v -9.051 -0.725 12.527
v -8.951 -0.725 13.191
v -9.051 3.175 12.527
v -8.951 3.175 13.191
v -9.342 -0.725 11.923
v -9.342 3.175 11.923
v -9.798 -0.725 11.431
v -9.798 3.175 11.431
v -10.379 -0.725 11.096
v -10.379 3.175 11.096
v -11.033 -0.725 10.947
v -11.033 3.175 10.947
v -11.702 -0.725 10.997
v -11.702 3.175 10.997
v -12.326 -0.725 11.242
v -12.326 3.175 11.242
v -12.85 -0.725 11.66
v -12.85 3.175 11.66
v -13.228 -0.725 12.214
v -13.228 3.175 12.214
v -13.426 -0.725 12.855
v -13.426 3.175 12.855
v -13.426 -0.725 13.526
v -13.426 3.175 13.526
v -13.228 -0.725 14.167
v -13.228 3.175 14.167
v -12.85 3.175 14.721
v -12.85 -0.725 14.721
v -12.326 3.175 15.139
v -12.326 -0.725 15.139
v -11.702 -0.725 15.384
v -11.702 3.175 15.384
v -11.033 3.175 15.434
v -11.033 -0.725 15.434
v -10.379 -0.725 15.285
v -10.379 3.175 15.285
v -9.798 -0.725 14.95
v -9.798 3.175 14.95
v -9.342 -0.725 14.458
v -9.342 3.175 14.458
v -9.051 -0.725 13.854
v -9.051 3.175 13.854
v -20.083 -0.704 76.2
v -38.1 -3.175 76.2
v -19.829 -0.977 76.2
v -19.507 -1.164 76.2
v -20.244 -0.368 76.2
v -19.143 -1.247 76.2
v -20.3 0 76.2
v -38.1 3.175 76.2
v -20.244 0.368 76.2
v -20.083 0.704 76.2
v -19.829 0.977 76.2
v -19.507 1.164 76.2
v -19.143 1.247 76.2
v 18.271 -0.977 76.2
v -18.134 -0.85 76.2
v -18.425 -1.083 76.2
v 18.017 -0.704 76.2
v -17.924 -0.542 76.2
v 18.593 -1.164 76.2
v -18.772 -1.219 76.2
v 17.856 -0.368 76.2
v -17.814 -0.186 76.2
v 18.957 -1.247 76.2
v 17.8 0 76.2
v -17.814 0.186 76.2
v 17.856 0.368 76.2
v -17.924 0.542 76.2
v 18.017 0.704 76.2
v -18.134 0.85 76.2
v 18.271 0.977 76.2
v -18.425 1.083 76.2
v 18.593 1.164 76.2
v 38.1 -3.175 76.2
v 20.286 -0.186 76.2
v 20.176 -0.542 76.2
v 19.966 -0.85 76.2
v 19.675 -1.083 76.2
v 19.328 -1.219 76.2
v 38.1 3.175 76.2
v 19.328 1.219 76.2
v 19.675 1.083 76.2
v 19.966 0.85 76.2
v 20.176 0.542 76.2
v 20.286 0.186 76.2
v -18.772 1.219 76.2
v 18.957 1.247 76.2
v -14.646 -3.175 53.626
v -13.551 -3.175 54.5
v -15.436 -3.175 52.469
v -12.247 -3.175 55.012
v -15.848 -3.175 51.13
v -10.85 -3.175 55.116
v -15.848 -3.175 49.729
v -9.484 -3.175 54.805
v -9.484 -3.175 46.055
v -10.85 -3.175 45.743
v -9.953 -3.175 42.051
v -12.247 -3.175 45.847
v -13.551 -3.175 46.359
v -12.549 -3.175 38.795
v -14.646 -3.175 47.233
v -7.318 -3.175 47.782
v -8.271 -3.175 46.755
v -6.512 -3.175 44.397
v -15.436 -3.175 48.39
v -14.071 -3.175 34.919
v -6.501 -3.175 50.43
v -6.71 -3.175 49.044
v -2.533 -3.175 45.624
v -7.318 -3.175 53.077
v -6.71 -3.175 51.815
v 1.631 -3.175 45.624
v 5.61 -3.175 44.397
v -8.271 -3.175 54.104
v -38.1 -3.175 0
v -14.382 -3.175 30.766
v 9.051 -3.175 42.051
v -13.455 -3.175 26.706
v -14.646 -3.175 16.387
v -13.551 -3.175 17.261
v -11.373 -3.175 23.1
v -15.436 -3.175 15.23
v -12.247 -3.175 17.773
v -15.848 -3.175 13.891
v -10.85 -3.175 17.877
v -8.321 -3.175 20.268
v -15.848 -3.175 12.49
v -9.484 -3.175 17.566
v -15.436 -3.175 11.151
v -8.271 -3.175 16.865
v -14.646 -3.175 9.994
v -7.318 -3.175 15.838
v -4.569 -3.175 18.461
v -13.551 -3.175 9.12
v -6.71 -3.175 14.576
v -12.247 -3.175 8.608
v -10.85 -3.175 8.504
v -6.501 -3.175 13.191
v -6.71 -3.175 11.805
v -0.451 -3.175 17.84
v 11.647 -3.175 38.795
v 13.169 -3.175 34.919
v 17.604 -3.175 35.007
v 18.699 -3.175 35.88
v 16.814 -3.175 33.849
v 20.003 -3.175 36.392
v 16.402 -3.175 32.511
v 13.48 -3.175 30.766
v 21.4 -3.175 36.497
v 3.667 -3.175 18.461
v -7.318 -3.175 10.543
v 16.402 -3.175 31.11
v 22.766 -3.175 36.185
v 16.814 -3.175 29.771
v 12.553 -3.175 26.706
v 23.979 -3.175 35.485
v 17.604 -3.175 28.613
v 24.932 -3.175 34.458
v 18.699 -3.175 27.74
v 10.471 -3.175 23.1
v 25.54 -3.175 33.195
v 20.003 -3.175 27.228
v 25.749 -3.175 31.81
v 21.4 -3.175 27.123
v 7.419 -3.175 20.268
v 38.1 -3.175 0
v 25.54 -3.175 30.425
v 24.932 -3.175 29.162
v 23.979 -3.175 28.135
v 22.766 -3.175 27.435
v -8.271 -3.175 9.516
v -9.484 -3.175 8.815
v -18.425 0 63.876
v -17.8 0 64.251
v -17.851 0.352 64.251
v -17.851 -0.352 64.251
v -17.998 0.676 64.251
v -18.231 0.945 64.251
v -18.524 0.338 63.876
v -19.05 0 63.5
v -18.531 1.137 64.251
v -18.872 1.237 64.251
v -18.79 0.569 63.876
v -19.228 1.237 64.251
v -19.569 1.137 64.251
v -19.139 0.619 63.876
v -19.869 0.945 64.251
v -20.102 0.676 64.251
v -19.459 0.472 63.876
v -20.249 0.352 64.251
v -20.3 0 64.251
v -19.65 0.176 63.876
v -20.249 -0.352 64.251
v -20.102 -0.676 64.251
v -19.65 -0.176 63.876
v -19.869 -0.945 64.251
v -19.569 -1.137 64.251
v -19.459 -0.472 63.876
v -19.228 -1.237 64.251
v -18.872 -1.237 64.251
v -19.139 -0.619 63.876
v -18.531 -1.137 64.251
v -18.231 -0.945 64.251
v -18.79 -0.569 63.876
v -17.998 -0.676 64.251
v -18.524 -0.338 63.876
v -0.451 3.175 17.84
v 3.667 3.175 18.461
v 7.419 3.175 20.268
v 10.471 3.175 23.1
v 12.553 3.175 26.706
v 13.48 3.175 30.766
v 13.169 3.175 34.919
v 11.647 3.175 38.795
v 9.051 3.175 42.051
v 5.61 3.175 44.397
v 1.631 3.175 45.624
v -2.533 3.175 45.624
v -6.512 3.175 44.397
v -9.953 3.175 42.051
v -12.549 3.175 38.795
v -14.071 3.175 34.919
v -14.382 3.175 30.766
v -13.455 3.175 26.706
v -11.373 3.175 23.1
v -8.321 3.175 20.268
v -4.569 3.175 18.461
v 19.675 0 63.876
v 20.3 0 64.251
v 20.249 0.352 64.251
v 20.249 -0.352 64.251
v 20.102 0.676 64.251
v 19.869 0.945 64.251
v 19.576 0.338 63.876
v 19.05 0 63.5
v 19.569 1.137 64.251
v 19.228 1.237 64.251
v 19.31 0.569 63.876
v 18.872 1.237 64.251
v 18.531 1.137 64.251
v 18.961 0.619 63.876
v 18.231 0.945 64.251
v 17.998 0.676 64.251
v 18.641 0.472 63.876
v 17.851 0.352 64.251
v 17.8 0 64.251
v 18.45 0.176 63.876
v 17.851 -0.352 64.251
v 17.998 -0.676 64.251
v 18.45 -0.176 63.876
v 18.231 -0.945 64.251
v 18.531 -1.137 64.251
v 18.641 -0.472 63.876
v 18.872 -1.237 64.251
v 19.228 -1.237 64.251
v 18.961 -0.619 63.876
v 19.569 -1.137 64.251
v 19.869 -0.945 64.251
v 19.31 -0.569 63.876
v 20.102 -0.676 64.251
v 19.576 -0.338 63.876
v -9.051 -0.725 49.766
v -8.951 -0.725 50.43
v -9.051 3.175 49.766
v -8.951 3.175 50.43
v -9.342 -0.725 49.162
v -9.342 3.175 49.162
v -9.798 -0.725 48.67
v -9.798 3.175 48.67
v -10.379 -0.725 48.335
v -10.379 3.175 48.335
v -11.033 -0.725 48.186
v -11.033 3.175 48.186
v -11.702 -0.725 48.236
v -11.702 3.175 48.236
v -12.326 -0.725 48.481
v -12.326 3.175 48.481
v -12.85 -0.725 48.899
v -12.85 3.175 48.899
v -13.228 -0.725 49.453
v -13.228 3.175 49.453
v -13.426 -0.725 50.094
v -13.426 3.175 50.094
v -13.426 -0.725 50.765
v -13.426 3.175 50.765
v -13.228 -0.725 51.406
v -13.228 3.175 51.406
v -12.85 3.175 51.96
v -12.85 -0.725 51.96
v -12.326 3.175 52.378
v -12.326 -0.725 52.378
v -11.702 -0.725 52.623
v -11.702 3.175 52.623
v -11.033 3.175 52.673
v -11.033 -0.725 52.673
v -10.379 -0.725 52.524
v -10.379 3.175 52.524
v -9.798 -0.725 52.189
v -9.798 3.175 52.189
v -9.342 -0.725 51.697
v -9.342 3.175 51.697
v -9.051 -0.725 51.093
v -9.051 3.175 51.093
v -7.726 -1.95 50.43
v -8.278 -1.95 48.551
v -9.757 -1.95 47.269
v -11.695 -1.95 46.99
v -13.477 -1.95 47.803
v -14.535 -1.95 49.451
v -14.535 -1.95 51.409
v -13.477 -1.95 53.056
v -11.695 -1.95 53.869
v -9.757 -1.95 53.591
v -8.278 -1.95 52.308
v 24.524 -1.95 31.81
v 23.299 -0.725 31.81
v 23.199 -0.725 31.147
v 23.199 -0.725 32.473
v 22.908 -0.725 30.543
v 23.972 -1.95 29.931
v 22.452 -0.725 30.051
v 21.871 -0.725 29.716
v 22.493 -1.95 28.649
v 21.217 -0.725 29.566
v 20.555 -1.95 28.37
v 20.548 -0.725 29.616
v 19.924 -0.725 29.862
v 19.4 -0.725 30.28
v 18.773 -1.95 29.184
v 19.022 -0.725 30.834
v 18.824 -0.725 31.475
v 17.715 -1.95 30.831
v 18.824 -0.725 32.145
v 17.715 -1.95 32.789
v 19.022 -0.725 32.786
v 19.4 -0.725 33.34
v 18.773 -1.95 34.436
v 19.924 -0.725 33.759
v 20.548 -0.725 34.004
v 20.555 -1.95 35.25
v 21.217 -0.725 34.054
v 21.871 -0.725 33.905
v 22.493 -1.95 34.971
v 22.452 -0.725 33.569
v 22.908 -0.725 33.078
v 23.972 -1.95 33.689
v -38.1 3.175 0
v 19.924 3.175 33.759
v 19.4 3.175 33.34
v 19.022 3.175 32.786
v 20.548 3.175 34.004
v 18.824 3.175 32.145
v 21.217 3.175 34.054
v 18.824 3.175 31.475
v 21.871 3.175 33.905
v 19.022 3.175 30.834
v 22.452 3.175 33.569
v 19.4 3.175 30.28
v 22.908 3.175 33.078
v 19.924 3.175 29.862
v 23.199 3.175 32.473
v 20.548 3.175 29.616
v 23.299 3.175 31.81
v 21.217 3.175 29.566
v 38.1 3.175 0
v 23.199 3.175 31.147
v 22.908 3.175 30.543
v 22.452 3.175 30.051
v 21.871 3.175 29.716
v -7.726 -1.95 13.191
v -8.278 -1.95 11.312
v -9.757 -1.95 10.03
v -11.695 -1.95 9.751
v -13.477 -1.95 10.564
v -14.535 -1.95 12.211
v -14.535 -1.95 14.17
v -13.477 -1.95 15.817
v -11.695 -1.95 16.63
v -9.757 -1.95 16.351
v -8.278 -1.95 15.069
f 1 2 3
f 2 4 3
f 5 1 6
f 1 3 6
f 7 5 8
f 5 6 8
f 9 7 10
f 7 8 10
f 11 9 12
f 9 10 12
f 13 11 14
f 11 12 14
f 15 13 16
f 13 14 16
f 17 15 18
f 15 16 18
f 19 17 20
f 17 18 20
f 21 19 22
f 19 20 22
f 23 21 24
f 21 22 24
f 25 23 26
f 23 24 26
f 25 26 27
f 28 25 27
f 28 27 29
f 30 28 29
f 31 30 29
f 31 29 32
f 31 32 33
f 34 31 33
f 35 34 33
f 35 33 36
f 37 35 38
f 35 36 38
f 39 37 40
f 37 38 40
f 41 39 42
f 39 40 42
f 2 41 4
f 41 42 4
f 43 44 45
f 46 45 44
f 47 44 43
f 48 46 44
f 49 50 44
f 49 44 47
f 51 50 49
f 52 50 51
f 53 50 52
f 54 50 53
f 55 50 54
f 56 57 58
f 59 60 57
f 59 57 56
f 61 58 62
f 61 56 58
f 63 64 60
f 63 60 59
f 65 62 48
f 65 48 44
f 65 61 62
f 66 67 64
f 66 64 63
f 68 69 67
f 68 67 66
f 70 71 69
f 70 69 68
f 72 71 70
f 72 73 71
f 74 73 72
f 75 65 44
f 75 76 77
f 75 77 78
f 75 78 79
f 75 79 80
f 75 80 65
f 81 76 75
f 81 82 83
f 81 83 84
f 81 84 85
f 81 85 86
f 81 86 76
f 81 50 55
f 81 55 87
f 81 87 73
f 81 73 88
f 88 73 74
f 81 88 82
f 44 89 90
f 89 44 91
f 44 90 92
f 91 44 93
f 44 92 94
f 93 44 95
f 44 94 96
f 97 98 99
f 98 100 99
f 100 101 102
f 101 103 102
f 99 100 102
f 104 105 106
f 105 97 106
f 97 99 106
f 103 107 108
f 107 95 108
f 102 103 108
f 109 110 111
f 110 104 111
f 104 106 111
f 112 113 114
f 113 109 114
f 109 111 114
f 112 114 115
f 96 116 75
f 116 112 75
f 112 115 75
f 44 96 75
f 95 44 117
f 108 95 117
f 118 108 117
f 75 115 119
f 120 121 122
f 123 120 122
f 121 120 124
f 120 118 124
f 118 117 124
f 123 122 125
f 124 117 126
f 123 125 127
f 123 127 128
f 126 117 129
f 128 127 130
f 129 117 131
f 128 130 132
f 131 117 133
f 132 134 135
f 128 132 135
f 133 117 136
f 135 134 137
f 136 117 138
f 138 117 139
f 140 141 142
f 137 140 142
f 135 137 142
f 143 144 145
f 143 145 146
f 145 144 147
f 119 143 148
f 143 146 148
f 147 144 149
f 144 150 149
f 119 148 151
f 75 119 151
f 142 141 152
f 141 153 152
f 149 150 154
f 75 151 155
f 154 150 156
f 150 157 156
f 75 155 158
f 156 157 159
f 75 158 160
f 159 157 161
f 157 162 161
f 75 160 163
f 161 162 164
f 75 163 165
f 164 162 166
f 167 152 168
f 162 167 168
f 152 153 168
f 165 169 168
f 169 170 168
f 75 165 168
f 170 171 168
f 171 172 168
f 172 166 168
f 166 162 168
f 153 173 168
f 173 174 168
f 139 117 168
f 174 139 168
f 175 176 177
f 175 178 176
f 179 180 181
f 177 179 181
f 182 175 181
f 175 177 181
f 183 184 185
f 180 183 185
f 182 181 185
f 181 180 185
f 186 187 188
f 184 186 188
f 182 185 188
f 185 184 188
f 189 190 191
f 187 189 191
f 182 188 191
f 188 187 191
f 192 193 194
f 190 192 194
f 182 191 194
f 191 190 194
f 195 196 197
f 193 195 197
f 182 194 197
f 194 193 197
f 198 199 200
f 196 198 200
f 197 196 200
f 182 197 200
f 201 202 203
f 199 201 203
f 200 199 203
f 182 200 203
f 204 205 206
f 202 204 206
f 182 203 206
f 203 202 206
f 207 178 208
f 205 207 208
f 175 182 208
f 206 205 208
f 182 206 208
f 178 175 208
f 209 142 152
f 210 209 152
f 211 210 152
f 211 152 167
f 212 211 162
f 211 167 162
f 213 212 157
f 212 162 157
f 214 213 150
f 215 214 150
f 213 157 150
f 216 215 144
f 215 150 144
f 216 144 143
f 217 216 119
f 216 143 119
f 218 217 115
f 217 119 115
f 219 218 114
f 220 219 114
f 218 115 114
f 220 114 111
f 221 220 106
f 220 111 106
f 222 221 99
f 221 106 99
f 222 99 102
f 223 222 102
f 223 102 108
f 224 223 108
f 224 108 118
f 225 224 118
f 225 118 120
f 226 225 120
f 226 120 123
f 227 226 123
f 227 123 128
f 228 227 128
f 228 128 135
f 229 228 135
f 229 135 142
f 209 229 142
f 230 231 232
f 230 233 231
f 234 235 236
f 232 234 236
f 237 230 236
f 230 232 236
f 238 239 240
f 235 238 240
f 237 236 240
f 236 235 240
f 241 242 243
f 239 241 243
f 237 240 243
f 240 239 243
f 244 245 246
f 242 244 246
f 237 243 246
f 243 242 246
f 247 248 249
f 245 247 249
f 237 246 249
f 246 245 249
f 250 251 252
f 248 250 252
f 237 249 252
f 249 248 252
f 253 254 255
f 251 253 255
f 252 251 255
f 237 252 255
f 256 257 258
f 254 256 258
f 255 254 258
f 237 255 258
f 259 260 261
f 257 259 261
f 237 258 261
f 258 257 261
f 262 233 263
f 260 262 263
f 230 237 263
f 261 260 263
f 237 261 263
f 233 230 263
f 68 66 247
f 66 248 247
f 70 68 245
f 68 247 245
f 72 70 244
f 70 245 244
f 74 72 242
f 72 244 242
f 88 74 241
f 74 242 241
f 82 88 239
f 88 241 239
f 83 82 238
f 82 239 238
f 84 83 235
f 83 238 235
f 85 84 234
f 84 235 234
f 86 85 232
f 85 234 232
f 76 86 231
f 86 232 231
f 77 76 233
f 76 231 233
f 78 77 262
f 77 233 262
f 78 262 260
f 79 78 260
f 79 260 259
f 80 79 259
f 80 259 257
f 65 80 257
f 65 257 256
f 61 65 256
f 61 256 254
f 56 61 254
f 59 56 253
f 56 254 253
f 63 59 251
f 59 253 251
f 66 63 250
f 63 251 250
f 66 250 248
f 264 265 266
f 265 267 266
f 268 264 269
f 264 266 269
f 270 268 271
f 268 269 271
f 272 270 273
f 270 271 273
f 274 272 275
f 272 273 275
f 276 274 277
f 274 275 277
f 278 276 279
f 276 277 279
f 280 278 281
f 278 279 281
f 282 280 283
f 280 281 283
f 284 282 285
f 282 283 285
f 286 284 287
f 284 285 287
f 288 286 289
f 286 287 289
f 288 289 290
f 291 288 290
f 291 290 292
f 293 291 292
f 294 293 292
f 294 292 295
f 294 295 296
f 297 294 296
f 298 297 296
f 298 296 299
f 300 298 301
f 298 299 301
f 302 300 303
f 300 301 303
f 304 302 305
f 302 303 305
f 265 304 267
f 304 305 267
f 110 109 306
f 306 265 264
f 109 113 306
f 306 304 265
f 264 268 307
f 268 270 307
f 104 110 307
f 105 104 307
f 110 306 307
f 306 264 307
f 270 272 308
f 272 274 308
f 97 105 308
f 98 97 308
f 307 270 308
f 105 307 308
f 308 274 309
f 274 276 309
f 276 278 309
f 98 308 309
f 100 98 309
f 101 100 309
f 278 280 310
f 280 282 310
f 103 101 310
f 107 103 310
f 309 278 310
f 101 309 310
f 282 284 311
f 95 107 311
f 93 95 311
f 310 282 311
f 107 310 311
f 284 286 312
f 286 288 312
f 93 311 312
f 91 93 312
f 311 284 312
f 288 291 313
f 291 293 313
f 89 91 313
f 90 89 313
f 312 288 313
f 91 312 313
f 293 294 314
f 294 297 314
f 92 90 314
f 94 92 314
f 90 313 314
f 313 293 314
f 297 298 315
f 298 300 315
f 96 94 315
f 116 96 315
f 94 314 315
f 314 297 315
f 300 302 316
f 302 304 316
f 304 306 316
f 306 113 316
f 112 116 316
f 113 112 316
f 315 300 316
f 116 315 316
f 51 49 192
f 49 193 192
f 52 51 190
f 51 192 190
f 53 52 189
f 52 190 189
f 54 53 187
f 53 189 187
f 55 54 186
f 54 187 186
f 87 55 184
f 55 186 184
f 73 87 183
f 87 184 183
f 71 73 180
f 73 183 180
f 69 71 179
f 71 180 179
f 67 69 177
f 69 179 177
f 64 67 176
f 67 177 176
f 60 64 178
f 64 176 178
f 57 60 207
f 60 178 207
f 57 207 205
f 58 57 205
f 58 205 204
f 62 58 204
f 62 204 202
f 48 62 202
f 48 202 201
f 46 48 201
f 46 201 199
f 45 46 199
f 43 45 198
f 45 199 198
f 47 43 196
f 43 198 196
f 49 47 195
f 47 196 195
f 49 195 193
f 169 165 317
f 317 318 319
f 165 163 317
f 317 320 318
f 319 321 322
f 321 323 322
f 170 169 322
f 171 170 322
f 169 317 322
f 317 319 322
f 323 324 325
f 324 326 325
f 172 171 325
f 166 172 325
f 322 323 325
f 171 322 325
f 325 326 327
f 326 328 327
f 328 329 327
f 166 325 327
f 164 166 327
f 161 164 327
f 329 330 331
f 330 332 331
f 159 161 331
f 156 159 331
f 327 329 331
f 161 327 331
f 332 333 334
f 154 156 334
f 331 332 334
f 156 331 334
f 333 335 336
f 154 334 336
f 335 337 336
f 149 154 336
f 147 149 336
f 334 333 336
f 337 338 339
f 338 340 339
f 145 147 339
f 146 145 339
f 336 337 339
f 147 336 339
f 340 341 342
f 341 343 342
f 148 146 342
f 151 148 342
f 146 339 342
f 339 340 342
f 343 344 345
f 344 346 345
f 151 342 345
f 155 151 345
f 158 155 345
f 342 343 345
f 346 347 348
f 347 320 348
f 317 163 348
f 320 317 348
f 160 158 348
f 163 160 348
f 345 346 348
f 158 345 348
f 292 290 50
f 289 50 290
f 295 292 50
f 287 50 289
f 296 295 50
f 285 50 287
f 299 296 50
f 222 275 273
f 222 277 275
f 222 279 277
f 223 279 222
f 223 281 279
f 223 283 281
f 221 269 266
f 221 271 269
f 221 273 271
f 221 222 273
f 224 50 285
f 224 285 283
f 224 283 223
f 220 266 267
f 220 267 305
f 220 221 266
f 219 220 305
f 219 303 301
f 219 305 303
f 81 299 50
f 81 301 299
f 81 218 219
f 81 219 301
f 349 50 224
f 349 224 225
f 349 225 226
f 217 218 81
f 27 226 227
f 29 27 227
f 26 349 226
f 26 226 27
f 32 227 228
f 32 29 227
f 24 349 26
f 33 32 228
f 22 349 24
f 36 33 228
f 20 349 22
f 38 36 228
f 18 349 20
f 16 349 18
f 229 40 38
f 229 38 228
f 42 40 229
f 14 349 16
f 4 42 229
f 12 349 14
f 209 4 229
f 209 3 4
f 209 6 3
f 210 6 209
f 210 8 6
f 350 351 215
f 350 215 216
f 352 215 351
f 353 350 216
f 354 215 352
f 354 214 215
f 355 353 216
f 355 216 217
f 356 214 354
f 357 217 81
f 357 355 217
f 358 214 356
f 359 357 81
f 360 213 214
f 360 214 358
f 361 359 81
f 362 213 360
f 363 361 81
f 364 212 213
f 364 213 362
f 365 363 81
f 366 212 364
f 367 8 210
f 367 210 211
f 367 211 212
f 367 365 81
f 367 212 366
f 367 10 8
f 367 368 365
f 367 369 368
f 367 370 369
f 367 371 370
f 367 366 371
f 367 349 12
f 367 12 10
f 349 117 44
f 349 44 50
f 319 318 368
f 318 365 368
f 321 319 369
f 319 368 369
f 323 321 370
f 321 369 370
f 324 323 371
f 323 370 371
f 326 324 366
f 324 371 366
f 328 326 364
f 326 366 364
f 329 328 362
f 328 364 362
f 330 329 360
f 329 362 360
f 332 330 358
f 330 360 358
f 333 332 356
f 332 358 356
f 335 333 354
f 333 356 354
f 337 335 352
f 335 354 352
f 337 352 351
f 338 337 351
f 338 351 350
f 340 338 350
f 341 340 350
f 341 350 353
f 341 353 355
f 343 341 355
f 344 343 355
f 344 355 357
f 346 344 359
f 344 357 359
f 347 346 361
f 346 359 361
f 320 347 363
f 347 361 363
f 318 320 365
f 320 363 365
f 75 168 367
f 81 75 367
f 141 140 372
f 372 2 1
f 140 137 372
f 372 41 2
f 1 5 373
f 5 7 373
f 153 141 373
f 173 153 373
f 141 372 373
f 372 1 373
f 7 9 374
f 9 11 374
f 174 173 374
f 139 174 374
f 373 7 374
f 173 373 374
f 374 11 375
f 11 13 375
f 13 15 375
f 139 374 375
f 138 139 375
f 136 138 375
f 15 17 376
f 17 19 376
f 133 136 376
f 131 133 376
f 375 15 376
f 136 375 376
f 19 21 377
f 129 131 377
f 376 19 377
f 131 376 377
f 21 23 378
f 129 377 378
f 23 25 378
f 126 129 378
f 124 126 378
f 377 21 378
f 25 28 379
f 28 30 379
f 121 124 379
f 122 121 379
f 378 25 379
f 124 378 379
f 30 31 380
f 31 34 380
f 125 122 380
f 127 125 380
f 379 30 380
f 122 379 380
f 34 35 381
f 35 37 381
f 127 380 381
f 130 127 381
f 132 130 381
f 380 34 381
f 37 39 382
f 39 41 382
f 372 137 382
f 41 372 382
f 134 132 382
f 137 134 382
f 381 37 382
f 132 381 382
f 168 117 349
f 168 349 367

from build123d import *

# Parameters (mm, degrees)
BOSS_EXTRUDE1_DEPTH                             = 76.2
BOSS_EXTRUDE1_DEPTH_BACK                        = 76.2
SKETCH3_W                                       = 76.2
SKETCH3_H                                       = 6.35
SKETCH11_R                                      = 13.97
CUT_EXTRUDE1_DEPTH                              = 86.430512699
CSK_FOR_M4_FLAT_HEAD_MACHINE_SCREW1_D           = 4.5
CSK_FOR_M4_FLAT_HEAD_MACHINE_SCREW1_CSINK_D     = 9.4
CSK_FOR_M4_FLAT_HEAD_MACHINE_SCREW1_CSINK_ANGLE = 90
SKETCH20_W                                      = 76.2
SKETCH20_H                                      = 76.2
CUT_EXTRUDE2_DEPTH                              = 86.430512699
M3X0_5_TAPPED_HOLE3_D                           = 2.5
M3X0_5_TAPPED_HOLE3_DEPTH                       = 11.948924226
M3X0_5_TAPPED_HOLE3_TIP                         = 0.751075774


with BuildPart() as part:
    # Sketch3 → Boss-Extrude1 (new, two sides: drawn at the far end of the back side and taken through both)
    with BuildSketch(Plane.XY.offset(-BOSS_EXTRUDE1_DEPTH_BACK)):
        Rectangle(SKETCH3_W, SKETCH3_H)
    extrude(amount=BOSS_EXTRUDE1_DEPTH + BOSS_EXTRUDE1_DEPTH_BACK)

    # Sketch11 → Cut-Extrude1 (cut, through all)
    with BuildSketch(Plane.XZ.offset(3.175)):
        with Locations(Location((-0.450951641, 31.810066373, 0), (0, 0, 270))):
            Circle(SKETCH11_R)
    extrude(amount=-CUT_EXTRUDE1_DEPTH, mode=Mode.SUBTRACT)

    # CSK for M4 Flat Head Machine Screw1 (through all)
    with Locations(Plane(origin=(0, -3.175, 0), x_dir=(-1, 0, 0), z_dir=(0, -1, 0))):
        with Locations((11.200951641, -13.190520192), (-21.049048359, -31.810066373), (11.200951641, -50.429612554)):
            CounterSinkHole(CSK_FOR_M4_FLAT_HEAD_MACHINE_SCREW1_D / 2, CSK_FOR_M4_FLAT_HEAD_MACHINE_SCREW1_CSINK_D / 2, counter_sink_angle=CSK_FOR_M4_FLAT_HEAD_MACHINE_SCREW1_CSINK_ANGLE)

    # Sketch20 → Cut-Extrude2 (cut, through all)
    with BuildSketch(Plane.XZ.offset(3.175)):
        with Locations((0, -38.1)):
            Rectangle(SKETCH20_W, SKETCH20_H)
    extrude(amount=-CUT_EXTRUDE2_DEPTH, mode=Mode.SUBTRACT)

    # M3x0.5 Tapped Hole3
    with Locations(Plane.XY.offset(76.2)):
        with Locations((19.05, 0), (-19.05, 0)):
            Hole(M3X0_5_TAPPED_HOLE3_D / 2, depth=M3X0_5_TAPPED_HOLE3_DEPTH)
            with Locations((0, 0, -(M3X0_5_TAPPED_HOLE3_DEPTH + M3X0_5_TAPPED_HOLE3_TIP / 2))):  # 118° drill point
                Cone(0, M3X0_5_TAPPED_HOLE3_D / 2, M3X0_5_TAPPED_HOLE3_TIP, mode=Mode.SUBTRACT)


solid = part.part
